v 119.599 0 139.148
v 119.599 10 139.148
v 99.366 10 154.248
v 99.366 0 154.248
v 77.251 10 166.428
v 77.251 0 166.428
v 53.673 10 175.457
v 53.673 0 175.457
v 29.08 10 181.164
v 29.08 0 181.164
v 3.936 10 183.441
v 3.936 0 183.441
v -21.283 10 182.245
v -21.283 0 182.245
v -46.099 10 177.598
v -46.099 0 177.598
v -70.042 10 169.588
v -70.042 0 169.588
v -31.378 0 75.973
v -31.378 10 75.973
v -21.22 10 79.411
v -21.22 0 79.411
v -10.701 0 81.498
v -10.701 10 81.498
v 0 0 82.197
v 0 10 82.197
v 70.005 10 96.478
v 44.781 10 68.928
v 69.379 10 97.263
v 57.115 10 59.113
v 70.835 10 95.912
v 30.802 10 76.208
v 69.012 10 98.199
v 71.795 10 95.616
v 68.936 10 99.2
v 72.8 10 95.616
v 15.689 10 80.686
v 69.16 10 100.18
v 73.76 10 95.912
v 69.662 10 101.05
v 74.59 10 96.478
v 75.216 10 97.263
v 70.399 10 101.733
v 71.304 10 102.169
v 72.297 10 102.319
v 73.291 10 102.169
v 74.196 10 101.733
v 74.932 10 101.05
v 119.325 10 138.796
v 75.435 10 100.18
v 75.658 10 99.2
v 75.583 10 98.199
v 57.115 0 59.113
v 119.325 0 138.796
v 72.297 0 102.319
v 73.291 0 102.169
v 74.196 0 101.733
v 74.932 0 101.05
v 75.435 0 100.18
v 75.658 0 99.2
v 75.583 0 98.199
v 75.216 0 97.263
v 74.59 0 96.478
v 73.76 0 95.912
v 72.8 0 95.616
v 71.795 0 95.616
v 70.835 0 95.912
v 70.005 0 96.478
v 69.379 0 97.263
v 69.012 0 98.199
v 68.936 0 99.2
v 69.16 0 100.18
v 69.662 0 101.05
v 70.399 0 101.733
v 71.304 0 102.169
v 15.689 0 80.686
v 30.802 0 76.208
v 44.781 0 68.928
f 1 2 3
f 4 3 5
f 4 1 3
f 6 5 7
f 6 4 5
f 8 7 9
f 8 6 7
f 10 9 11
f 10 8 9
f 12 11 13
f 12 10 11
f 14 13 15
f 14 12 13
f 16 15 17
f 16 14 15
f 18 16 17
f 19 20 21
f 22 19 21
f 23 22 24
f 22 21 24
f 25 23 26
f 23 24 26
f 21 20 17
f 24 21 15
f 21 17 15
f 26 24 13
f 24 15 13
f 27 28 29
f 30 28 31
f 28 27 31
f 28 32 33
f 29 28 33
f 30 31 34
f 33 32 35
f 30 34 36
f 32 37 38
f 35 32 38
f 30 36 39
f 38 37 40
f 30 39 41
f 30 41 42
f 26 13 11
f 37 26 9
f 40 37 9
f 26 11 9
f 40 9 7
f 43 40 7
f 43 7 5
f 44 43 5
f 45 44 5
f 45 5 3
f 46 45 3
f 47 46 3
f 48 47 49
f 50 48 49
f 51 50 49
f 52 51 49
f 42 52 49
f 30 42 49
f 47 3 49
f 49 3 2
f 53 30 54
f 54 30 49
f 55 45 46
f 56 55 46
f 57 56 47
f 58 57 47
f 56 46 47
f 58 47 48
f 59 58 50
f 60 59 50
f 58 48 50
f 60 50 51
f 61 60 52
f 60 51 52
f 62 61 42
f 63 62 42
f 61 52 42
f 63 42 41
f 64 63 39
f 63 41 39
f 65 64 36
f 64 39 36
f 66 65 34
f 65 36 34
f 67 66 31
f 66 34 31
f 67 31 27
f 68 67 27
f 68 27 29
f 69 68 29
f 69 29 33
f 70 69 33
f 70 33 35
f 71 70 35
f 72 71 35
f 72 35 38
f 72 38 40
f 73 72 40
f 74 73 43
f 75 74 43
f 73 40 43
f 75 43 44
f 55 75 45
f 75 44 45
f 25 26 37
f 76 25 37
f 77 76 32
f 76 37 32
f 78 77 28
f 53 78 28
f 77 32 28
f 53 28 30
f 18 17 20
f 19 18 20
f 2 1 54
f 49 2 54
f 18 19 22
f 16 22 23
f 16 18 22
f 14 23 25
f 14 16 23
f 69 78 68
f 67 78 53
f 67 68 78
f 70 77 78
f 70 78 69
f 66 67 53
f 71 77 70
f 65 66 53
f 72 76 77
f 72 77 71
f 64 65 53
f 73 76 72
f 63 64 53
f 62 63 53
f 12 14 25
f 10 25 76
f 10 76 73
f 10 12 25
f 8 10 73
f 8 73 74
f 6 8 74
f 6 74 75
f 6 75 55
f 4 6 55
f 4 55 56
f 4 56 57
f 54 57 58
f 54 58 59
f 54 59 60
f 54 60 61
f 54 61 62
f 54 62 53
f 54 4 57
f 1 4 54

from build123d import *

# Parameters (mm, degrees)
SKETCH_1_R           = 210
EXTRUDE_1_DEPTH      = 10
SKETCH_2_R           = 75
CUT_EXTRUDE_1_DEPTH  = 10
SKETCH_4_R           = 82.197423103
CUT_EXTRUDE_3_DEPTH  = 10
SKETCH_5_R           = 232.576786868
SKETCH_5_R_2         = 183.037626036
CUT_EXTRUDE_4_DEPTH  = 10
CUT_EXTRUDE_6_DEPTH  = 10
CUT_EXTRUDE_7_DEPTH  = 10
EXTRUDE_2_DEPTH      = 10
SKETCH_8_R           = 3.37024185
CUT_EXTRUDE_9_DEPTH  = 10
EXTRUDE_START        = -10
EXTRUDE_3_DEPTH      = 10
SKETCH_10_R          = 221.118951793
SKETCH_10_R_2        = 189.34656242
CUT_EXTRUDE_10_DEPTH = 20
SKETCH_11_R          = 238.000555744
SKETCH_11_R_2        = 183.483177488
CUT_EXTRUDE_11_DEPTH = 20


with BuildPart() as part:
    # 草图1 → 凸台-拉伸1 (new body)
    with BuildSketch(Plane(origin=(0, 0, 0), x_dir=(1, 0, 0), z_dir=(0, 1, 0))):
        with Locations(Location((0, 0, 0), (0, 0, 270))):
            Circle(SKETCH_1_R)
    extrude(amount=EXTRUDE_1_DEPTH)

    # 草图2 → 切除-拉伸1 (cut)
    with BuildSketch(Plane(origin=(0, 10, 0), x_dir=(1, 0, 0), z_dir=(0, 1, 0))):
        with Locations(Location((0, 0, 0), (0, 0, 270))):
            Circle(SKETCH_2_R)
    extrude(amount=-CUT_EXTRUDE_1_DEPTH, mode=Mode.SUBTRACT)

    # 草图4 → 切除-拉伸3 (cut)
    with BuildSketch(Plane(origin=(0, 10, 0), x_dir=(1, 0, 0), z_dir=(0, 1, 0))):
        with Locations(Location((0, 0, 0), (0, 0, 270))):
            Circle(SKETCH_4_R)
    extrude(amount=-CUT_EXTRUDE_3_DEPTH, mode=Mode.SUBTRACT)

    # 草图5 → 切除-拉伸4 (cut)
    with BuildSketch(Plane(origin=(0, 10, 0), x_dir=(1, 0, 0), z_dir=(0, 1, 0))):
        Circle(SKETCH_5_R)
        with Locations(Location((0, 0, 0), (0, 0, 270))):
            Circle(SKETCH_5_R_2, mode=Mode.SUBTRACT)
    extrude(amount=-CUT_EXTRUDE_4_DEPTH, mode=Mode.SUBTRACT)

    # 草图3 → 切除-拉伸6 (cut)
    with BuildSketch(Plane(origin=(0, 10, 0), x_dir=(1, 0, 0), z_dir=(0, 1, 0))):
        Polygon((-218.107078413, -133.413550562), (-168.78547064, -202.149571439), (-50, -50), (50, -50), (168.78547064, -202.149571439), (64.609548257, -313.747882065), (267.248585971, -202.149571439), (429.751389162, 108.172046702), (-16.641853339, 302.979624022), (-278.723850855, 176.468454352), align=None)
    extrude(amount=-CUT_EXTRUDE_6_DEPTH, mode=Mode.SUBTRACT)

    # 草图6 → 切除-拉伸7 (cut)
    with BuildSketch(Plane(origin=(0, 10, 0), x_dir=(1, 0, 0), z_dir=(0, 1, 0))):
        Polygon((0, 0), (0, -233.405297089), (-177.211837764, -160.795172893), (-110.712466595, -38.220656306), align=None)
    extrude(amount=-CUT_EXTRUDE_7_DEPTH, mode=Mode.SUBTRACT)

    # 草图7 → 凸台-拉伸2 (add)
    with BuildSketch(Plane(origin=(0, 10, 0), x_dir=(1, 0, 0), z_dir=(0, 1, 0))):
        with BuildLine():
            Line((0, -131.161321566), (0, -190))
            ThreePointArc((0, -190), (65.897168622, -178.206518308), (123.6137367, -144.290138606))
            Line((123.6137367, -144.290138606), (94.010463478, -106.371988266))
            Line((94.010463478, -106.371988266), (0, -131.161321566))
        make_face()
    extrude(amount=-EXTRUDE_2_DEPTH)

    # 草图8 → 切除-拉伸9 (cut)
    with BuildSketch(Plane(origin=(0, 10, 0), x_dir=(1, 0, 0), z_dir=(0, 1, 0))):
        with Locations(Location((72.297266291, -98.948546348, 0), (0, 0, 270))):
            Circle(SKETCH_8_R)
    extrude(amount=-CUT_EXTRUDE_9_DEPTH, mode=Mode.SUBTRACT)

    # 草图9 → 凸台-拉伸3 (add)
    with BuildSketch(Plane.XZ.offset(EXTRUDE_START)):
        with BuildLine():
            Line((-72.52965516, 175.611642901), (-31.37763554, 75.972760596))
            ThreePointArc((-31.37763554, 75.972760596), (-15.994549348, 80.626241112), (0, 82.197423103))
            Line((0, 82.197423103), (0, 190))
            ThreePointArc((0, 190), (-36.971528565, 186.36820028), (-72.52965516, 175.611642901))
        make_face()
    extrude(amount=EXTRUDE_3_DEPTH)

    # 草图10 → 切除-拉伸10 (cut)
    with BuildSketch(Plane.XZ):
        with Locations((6.928171241, 3.379528268)):
            Circle(SKETCH_10_R)
        Circle(SKETCH_10_R_2, mode=Mode.SUBTRACT)
    extrude(amount=-CUT_EXTRUDE_10_DEPTH, mode=Mode.SUBTRACT)

    # 草图11 → 切除-拉伸11 (cut)
    with BuildSketch(Plane.XZ):
        with Locations((0, 17.732727097)):
            Circle(SKETCH_11_R)
        Circle(SKETCH_11_R_2, mode=Mode.SUBTRACT)
    extrude(amount=-CUT_EXTRUDE_11_DEPTH, mode=Mode.SUBTRACT)


solid = part.part
